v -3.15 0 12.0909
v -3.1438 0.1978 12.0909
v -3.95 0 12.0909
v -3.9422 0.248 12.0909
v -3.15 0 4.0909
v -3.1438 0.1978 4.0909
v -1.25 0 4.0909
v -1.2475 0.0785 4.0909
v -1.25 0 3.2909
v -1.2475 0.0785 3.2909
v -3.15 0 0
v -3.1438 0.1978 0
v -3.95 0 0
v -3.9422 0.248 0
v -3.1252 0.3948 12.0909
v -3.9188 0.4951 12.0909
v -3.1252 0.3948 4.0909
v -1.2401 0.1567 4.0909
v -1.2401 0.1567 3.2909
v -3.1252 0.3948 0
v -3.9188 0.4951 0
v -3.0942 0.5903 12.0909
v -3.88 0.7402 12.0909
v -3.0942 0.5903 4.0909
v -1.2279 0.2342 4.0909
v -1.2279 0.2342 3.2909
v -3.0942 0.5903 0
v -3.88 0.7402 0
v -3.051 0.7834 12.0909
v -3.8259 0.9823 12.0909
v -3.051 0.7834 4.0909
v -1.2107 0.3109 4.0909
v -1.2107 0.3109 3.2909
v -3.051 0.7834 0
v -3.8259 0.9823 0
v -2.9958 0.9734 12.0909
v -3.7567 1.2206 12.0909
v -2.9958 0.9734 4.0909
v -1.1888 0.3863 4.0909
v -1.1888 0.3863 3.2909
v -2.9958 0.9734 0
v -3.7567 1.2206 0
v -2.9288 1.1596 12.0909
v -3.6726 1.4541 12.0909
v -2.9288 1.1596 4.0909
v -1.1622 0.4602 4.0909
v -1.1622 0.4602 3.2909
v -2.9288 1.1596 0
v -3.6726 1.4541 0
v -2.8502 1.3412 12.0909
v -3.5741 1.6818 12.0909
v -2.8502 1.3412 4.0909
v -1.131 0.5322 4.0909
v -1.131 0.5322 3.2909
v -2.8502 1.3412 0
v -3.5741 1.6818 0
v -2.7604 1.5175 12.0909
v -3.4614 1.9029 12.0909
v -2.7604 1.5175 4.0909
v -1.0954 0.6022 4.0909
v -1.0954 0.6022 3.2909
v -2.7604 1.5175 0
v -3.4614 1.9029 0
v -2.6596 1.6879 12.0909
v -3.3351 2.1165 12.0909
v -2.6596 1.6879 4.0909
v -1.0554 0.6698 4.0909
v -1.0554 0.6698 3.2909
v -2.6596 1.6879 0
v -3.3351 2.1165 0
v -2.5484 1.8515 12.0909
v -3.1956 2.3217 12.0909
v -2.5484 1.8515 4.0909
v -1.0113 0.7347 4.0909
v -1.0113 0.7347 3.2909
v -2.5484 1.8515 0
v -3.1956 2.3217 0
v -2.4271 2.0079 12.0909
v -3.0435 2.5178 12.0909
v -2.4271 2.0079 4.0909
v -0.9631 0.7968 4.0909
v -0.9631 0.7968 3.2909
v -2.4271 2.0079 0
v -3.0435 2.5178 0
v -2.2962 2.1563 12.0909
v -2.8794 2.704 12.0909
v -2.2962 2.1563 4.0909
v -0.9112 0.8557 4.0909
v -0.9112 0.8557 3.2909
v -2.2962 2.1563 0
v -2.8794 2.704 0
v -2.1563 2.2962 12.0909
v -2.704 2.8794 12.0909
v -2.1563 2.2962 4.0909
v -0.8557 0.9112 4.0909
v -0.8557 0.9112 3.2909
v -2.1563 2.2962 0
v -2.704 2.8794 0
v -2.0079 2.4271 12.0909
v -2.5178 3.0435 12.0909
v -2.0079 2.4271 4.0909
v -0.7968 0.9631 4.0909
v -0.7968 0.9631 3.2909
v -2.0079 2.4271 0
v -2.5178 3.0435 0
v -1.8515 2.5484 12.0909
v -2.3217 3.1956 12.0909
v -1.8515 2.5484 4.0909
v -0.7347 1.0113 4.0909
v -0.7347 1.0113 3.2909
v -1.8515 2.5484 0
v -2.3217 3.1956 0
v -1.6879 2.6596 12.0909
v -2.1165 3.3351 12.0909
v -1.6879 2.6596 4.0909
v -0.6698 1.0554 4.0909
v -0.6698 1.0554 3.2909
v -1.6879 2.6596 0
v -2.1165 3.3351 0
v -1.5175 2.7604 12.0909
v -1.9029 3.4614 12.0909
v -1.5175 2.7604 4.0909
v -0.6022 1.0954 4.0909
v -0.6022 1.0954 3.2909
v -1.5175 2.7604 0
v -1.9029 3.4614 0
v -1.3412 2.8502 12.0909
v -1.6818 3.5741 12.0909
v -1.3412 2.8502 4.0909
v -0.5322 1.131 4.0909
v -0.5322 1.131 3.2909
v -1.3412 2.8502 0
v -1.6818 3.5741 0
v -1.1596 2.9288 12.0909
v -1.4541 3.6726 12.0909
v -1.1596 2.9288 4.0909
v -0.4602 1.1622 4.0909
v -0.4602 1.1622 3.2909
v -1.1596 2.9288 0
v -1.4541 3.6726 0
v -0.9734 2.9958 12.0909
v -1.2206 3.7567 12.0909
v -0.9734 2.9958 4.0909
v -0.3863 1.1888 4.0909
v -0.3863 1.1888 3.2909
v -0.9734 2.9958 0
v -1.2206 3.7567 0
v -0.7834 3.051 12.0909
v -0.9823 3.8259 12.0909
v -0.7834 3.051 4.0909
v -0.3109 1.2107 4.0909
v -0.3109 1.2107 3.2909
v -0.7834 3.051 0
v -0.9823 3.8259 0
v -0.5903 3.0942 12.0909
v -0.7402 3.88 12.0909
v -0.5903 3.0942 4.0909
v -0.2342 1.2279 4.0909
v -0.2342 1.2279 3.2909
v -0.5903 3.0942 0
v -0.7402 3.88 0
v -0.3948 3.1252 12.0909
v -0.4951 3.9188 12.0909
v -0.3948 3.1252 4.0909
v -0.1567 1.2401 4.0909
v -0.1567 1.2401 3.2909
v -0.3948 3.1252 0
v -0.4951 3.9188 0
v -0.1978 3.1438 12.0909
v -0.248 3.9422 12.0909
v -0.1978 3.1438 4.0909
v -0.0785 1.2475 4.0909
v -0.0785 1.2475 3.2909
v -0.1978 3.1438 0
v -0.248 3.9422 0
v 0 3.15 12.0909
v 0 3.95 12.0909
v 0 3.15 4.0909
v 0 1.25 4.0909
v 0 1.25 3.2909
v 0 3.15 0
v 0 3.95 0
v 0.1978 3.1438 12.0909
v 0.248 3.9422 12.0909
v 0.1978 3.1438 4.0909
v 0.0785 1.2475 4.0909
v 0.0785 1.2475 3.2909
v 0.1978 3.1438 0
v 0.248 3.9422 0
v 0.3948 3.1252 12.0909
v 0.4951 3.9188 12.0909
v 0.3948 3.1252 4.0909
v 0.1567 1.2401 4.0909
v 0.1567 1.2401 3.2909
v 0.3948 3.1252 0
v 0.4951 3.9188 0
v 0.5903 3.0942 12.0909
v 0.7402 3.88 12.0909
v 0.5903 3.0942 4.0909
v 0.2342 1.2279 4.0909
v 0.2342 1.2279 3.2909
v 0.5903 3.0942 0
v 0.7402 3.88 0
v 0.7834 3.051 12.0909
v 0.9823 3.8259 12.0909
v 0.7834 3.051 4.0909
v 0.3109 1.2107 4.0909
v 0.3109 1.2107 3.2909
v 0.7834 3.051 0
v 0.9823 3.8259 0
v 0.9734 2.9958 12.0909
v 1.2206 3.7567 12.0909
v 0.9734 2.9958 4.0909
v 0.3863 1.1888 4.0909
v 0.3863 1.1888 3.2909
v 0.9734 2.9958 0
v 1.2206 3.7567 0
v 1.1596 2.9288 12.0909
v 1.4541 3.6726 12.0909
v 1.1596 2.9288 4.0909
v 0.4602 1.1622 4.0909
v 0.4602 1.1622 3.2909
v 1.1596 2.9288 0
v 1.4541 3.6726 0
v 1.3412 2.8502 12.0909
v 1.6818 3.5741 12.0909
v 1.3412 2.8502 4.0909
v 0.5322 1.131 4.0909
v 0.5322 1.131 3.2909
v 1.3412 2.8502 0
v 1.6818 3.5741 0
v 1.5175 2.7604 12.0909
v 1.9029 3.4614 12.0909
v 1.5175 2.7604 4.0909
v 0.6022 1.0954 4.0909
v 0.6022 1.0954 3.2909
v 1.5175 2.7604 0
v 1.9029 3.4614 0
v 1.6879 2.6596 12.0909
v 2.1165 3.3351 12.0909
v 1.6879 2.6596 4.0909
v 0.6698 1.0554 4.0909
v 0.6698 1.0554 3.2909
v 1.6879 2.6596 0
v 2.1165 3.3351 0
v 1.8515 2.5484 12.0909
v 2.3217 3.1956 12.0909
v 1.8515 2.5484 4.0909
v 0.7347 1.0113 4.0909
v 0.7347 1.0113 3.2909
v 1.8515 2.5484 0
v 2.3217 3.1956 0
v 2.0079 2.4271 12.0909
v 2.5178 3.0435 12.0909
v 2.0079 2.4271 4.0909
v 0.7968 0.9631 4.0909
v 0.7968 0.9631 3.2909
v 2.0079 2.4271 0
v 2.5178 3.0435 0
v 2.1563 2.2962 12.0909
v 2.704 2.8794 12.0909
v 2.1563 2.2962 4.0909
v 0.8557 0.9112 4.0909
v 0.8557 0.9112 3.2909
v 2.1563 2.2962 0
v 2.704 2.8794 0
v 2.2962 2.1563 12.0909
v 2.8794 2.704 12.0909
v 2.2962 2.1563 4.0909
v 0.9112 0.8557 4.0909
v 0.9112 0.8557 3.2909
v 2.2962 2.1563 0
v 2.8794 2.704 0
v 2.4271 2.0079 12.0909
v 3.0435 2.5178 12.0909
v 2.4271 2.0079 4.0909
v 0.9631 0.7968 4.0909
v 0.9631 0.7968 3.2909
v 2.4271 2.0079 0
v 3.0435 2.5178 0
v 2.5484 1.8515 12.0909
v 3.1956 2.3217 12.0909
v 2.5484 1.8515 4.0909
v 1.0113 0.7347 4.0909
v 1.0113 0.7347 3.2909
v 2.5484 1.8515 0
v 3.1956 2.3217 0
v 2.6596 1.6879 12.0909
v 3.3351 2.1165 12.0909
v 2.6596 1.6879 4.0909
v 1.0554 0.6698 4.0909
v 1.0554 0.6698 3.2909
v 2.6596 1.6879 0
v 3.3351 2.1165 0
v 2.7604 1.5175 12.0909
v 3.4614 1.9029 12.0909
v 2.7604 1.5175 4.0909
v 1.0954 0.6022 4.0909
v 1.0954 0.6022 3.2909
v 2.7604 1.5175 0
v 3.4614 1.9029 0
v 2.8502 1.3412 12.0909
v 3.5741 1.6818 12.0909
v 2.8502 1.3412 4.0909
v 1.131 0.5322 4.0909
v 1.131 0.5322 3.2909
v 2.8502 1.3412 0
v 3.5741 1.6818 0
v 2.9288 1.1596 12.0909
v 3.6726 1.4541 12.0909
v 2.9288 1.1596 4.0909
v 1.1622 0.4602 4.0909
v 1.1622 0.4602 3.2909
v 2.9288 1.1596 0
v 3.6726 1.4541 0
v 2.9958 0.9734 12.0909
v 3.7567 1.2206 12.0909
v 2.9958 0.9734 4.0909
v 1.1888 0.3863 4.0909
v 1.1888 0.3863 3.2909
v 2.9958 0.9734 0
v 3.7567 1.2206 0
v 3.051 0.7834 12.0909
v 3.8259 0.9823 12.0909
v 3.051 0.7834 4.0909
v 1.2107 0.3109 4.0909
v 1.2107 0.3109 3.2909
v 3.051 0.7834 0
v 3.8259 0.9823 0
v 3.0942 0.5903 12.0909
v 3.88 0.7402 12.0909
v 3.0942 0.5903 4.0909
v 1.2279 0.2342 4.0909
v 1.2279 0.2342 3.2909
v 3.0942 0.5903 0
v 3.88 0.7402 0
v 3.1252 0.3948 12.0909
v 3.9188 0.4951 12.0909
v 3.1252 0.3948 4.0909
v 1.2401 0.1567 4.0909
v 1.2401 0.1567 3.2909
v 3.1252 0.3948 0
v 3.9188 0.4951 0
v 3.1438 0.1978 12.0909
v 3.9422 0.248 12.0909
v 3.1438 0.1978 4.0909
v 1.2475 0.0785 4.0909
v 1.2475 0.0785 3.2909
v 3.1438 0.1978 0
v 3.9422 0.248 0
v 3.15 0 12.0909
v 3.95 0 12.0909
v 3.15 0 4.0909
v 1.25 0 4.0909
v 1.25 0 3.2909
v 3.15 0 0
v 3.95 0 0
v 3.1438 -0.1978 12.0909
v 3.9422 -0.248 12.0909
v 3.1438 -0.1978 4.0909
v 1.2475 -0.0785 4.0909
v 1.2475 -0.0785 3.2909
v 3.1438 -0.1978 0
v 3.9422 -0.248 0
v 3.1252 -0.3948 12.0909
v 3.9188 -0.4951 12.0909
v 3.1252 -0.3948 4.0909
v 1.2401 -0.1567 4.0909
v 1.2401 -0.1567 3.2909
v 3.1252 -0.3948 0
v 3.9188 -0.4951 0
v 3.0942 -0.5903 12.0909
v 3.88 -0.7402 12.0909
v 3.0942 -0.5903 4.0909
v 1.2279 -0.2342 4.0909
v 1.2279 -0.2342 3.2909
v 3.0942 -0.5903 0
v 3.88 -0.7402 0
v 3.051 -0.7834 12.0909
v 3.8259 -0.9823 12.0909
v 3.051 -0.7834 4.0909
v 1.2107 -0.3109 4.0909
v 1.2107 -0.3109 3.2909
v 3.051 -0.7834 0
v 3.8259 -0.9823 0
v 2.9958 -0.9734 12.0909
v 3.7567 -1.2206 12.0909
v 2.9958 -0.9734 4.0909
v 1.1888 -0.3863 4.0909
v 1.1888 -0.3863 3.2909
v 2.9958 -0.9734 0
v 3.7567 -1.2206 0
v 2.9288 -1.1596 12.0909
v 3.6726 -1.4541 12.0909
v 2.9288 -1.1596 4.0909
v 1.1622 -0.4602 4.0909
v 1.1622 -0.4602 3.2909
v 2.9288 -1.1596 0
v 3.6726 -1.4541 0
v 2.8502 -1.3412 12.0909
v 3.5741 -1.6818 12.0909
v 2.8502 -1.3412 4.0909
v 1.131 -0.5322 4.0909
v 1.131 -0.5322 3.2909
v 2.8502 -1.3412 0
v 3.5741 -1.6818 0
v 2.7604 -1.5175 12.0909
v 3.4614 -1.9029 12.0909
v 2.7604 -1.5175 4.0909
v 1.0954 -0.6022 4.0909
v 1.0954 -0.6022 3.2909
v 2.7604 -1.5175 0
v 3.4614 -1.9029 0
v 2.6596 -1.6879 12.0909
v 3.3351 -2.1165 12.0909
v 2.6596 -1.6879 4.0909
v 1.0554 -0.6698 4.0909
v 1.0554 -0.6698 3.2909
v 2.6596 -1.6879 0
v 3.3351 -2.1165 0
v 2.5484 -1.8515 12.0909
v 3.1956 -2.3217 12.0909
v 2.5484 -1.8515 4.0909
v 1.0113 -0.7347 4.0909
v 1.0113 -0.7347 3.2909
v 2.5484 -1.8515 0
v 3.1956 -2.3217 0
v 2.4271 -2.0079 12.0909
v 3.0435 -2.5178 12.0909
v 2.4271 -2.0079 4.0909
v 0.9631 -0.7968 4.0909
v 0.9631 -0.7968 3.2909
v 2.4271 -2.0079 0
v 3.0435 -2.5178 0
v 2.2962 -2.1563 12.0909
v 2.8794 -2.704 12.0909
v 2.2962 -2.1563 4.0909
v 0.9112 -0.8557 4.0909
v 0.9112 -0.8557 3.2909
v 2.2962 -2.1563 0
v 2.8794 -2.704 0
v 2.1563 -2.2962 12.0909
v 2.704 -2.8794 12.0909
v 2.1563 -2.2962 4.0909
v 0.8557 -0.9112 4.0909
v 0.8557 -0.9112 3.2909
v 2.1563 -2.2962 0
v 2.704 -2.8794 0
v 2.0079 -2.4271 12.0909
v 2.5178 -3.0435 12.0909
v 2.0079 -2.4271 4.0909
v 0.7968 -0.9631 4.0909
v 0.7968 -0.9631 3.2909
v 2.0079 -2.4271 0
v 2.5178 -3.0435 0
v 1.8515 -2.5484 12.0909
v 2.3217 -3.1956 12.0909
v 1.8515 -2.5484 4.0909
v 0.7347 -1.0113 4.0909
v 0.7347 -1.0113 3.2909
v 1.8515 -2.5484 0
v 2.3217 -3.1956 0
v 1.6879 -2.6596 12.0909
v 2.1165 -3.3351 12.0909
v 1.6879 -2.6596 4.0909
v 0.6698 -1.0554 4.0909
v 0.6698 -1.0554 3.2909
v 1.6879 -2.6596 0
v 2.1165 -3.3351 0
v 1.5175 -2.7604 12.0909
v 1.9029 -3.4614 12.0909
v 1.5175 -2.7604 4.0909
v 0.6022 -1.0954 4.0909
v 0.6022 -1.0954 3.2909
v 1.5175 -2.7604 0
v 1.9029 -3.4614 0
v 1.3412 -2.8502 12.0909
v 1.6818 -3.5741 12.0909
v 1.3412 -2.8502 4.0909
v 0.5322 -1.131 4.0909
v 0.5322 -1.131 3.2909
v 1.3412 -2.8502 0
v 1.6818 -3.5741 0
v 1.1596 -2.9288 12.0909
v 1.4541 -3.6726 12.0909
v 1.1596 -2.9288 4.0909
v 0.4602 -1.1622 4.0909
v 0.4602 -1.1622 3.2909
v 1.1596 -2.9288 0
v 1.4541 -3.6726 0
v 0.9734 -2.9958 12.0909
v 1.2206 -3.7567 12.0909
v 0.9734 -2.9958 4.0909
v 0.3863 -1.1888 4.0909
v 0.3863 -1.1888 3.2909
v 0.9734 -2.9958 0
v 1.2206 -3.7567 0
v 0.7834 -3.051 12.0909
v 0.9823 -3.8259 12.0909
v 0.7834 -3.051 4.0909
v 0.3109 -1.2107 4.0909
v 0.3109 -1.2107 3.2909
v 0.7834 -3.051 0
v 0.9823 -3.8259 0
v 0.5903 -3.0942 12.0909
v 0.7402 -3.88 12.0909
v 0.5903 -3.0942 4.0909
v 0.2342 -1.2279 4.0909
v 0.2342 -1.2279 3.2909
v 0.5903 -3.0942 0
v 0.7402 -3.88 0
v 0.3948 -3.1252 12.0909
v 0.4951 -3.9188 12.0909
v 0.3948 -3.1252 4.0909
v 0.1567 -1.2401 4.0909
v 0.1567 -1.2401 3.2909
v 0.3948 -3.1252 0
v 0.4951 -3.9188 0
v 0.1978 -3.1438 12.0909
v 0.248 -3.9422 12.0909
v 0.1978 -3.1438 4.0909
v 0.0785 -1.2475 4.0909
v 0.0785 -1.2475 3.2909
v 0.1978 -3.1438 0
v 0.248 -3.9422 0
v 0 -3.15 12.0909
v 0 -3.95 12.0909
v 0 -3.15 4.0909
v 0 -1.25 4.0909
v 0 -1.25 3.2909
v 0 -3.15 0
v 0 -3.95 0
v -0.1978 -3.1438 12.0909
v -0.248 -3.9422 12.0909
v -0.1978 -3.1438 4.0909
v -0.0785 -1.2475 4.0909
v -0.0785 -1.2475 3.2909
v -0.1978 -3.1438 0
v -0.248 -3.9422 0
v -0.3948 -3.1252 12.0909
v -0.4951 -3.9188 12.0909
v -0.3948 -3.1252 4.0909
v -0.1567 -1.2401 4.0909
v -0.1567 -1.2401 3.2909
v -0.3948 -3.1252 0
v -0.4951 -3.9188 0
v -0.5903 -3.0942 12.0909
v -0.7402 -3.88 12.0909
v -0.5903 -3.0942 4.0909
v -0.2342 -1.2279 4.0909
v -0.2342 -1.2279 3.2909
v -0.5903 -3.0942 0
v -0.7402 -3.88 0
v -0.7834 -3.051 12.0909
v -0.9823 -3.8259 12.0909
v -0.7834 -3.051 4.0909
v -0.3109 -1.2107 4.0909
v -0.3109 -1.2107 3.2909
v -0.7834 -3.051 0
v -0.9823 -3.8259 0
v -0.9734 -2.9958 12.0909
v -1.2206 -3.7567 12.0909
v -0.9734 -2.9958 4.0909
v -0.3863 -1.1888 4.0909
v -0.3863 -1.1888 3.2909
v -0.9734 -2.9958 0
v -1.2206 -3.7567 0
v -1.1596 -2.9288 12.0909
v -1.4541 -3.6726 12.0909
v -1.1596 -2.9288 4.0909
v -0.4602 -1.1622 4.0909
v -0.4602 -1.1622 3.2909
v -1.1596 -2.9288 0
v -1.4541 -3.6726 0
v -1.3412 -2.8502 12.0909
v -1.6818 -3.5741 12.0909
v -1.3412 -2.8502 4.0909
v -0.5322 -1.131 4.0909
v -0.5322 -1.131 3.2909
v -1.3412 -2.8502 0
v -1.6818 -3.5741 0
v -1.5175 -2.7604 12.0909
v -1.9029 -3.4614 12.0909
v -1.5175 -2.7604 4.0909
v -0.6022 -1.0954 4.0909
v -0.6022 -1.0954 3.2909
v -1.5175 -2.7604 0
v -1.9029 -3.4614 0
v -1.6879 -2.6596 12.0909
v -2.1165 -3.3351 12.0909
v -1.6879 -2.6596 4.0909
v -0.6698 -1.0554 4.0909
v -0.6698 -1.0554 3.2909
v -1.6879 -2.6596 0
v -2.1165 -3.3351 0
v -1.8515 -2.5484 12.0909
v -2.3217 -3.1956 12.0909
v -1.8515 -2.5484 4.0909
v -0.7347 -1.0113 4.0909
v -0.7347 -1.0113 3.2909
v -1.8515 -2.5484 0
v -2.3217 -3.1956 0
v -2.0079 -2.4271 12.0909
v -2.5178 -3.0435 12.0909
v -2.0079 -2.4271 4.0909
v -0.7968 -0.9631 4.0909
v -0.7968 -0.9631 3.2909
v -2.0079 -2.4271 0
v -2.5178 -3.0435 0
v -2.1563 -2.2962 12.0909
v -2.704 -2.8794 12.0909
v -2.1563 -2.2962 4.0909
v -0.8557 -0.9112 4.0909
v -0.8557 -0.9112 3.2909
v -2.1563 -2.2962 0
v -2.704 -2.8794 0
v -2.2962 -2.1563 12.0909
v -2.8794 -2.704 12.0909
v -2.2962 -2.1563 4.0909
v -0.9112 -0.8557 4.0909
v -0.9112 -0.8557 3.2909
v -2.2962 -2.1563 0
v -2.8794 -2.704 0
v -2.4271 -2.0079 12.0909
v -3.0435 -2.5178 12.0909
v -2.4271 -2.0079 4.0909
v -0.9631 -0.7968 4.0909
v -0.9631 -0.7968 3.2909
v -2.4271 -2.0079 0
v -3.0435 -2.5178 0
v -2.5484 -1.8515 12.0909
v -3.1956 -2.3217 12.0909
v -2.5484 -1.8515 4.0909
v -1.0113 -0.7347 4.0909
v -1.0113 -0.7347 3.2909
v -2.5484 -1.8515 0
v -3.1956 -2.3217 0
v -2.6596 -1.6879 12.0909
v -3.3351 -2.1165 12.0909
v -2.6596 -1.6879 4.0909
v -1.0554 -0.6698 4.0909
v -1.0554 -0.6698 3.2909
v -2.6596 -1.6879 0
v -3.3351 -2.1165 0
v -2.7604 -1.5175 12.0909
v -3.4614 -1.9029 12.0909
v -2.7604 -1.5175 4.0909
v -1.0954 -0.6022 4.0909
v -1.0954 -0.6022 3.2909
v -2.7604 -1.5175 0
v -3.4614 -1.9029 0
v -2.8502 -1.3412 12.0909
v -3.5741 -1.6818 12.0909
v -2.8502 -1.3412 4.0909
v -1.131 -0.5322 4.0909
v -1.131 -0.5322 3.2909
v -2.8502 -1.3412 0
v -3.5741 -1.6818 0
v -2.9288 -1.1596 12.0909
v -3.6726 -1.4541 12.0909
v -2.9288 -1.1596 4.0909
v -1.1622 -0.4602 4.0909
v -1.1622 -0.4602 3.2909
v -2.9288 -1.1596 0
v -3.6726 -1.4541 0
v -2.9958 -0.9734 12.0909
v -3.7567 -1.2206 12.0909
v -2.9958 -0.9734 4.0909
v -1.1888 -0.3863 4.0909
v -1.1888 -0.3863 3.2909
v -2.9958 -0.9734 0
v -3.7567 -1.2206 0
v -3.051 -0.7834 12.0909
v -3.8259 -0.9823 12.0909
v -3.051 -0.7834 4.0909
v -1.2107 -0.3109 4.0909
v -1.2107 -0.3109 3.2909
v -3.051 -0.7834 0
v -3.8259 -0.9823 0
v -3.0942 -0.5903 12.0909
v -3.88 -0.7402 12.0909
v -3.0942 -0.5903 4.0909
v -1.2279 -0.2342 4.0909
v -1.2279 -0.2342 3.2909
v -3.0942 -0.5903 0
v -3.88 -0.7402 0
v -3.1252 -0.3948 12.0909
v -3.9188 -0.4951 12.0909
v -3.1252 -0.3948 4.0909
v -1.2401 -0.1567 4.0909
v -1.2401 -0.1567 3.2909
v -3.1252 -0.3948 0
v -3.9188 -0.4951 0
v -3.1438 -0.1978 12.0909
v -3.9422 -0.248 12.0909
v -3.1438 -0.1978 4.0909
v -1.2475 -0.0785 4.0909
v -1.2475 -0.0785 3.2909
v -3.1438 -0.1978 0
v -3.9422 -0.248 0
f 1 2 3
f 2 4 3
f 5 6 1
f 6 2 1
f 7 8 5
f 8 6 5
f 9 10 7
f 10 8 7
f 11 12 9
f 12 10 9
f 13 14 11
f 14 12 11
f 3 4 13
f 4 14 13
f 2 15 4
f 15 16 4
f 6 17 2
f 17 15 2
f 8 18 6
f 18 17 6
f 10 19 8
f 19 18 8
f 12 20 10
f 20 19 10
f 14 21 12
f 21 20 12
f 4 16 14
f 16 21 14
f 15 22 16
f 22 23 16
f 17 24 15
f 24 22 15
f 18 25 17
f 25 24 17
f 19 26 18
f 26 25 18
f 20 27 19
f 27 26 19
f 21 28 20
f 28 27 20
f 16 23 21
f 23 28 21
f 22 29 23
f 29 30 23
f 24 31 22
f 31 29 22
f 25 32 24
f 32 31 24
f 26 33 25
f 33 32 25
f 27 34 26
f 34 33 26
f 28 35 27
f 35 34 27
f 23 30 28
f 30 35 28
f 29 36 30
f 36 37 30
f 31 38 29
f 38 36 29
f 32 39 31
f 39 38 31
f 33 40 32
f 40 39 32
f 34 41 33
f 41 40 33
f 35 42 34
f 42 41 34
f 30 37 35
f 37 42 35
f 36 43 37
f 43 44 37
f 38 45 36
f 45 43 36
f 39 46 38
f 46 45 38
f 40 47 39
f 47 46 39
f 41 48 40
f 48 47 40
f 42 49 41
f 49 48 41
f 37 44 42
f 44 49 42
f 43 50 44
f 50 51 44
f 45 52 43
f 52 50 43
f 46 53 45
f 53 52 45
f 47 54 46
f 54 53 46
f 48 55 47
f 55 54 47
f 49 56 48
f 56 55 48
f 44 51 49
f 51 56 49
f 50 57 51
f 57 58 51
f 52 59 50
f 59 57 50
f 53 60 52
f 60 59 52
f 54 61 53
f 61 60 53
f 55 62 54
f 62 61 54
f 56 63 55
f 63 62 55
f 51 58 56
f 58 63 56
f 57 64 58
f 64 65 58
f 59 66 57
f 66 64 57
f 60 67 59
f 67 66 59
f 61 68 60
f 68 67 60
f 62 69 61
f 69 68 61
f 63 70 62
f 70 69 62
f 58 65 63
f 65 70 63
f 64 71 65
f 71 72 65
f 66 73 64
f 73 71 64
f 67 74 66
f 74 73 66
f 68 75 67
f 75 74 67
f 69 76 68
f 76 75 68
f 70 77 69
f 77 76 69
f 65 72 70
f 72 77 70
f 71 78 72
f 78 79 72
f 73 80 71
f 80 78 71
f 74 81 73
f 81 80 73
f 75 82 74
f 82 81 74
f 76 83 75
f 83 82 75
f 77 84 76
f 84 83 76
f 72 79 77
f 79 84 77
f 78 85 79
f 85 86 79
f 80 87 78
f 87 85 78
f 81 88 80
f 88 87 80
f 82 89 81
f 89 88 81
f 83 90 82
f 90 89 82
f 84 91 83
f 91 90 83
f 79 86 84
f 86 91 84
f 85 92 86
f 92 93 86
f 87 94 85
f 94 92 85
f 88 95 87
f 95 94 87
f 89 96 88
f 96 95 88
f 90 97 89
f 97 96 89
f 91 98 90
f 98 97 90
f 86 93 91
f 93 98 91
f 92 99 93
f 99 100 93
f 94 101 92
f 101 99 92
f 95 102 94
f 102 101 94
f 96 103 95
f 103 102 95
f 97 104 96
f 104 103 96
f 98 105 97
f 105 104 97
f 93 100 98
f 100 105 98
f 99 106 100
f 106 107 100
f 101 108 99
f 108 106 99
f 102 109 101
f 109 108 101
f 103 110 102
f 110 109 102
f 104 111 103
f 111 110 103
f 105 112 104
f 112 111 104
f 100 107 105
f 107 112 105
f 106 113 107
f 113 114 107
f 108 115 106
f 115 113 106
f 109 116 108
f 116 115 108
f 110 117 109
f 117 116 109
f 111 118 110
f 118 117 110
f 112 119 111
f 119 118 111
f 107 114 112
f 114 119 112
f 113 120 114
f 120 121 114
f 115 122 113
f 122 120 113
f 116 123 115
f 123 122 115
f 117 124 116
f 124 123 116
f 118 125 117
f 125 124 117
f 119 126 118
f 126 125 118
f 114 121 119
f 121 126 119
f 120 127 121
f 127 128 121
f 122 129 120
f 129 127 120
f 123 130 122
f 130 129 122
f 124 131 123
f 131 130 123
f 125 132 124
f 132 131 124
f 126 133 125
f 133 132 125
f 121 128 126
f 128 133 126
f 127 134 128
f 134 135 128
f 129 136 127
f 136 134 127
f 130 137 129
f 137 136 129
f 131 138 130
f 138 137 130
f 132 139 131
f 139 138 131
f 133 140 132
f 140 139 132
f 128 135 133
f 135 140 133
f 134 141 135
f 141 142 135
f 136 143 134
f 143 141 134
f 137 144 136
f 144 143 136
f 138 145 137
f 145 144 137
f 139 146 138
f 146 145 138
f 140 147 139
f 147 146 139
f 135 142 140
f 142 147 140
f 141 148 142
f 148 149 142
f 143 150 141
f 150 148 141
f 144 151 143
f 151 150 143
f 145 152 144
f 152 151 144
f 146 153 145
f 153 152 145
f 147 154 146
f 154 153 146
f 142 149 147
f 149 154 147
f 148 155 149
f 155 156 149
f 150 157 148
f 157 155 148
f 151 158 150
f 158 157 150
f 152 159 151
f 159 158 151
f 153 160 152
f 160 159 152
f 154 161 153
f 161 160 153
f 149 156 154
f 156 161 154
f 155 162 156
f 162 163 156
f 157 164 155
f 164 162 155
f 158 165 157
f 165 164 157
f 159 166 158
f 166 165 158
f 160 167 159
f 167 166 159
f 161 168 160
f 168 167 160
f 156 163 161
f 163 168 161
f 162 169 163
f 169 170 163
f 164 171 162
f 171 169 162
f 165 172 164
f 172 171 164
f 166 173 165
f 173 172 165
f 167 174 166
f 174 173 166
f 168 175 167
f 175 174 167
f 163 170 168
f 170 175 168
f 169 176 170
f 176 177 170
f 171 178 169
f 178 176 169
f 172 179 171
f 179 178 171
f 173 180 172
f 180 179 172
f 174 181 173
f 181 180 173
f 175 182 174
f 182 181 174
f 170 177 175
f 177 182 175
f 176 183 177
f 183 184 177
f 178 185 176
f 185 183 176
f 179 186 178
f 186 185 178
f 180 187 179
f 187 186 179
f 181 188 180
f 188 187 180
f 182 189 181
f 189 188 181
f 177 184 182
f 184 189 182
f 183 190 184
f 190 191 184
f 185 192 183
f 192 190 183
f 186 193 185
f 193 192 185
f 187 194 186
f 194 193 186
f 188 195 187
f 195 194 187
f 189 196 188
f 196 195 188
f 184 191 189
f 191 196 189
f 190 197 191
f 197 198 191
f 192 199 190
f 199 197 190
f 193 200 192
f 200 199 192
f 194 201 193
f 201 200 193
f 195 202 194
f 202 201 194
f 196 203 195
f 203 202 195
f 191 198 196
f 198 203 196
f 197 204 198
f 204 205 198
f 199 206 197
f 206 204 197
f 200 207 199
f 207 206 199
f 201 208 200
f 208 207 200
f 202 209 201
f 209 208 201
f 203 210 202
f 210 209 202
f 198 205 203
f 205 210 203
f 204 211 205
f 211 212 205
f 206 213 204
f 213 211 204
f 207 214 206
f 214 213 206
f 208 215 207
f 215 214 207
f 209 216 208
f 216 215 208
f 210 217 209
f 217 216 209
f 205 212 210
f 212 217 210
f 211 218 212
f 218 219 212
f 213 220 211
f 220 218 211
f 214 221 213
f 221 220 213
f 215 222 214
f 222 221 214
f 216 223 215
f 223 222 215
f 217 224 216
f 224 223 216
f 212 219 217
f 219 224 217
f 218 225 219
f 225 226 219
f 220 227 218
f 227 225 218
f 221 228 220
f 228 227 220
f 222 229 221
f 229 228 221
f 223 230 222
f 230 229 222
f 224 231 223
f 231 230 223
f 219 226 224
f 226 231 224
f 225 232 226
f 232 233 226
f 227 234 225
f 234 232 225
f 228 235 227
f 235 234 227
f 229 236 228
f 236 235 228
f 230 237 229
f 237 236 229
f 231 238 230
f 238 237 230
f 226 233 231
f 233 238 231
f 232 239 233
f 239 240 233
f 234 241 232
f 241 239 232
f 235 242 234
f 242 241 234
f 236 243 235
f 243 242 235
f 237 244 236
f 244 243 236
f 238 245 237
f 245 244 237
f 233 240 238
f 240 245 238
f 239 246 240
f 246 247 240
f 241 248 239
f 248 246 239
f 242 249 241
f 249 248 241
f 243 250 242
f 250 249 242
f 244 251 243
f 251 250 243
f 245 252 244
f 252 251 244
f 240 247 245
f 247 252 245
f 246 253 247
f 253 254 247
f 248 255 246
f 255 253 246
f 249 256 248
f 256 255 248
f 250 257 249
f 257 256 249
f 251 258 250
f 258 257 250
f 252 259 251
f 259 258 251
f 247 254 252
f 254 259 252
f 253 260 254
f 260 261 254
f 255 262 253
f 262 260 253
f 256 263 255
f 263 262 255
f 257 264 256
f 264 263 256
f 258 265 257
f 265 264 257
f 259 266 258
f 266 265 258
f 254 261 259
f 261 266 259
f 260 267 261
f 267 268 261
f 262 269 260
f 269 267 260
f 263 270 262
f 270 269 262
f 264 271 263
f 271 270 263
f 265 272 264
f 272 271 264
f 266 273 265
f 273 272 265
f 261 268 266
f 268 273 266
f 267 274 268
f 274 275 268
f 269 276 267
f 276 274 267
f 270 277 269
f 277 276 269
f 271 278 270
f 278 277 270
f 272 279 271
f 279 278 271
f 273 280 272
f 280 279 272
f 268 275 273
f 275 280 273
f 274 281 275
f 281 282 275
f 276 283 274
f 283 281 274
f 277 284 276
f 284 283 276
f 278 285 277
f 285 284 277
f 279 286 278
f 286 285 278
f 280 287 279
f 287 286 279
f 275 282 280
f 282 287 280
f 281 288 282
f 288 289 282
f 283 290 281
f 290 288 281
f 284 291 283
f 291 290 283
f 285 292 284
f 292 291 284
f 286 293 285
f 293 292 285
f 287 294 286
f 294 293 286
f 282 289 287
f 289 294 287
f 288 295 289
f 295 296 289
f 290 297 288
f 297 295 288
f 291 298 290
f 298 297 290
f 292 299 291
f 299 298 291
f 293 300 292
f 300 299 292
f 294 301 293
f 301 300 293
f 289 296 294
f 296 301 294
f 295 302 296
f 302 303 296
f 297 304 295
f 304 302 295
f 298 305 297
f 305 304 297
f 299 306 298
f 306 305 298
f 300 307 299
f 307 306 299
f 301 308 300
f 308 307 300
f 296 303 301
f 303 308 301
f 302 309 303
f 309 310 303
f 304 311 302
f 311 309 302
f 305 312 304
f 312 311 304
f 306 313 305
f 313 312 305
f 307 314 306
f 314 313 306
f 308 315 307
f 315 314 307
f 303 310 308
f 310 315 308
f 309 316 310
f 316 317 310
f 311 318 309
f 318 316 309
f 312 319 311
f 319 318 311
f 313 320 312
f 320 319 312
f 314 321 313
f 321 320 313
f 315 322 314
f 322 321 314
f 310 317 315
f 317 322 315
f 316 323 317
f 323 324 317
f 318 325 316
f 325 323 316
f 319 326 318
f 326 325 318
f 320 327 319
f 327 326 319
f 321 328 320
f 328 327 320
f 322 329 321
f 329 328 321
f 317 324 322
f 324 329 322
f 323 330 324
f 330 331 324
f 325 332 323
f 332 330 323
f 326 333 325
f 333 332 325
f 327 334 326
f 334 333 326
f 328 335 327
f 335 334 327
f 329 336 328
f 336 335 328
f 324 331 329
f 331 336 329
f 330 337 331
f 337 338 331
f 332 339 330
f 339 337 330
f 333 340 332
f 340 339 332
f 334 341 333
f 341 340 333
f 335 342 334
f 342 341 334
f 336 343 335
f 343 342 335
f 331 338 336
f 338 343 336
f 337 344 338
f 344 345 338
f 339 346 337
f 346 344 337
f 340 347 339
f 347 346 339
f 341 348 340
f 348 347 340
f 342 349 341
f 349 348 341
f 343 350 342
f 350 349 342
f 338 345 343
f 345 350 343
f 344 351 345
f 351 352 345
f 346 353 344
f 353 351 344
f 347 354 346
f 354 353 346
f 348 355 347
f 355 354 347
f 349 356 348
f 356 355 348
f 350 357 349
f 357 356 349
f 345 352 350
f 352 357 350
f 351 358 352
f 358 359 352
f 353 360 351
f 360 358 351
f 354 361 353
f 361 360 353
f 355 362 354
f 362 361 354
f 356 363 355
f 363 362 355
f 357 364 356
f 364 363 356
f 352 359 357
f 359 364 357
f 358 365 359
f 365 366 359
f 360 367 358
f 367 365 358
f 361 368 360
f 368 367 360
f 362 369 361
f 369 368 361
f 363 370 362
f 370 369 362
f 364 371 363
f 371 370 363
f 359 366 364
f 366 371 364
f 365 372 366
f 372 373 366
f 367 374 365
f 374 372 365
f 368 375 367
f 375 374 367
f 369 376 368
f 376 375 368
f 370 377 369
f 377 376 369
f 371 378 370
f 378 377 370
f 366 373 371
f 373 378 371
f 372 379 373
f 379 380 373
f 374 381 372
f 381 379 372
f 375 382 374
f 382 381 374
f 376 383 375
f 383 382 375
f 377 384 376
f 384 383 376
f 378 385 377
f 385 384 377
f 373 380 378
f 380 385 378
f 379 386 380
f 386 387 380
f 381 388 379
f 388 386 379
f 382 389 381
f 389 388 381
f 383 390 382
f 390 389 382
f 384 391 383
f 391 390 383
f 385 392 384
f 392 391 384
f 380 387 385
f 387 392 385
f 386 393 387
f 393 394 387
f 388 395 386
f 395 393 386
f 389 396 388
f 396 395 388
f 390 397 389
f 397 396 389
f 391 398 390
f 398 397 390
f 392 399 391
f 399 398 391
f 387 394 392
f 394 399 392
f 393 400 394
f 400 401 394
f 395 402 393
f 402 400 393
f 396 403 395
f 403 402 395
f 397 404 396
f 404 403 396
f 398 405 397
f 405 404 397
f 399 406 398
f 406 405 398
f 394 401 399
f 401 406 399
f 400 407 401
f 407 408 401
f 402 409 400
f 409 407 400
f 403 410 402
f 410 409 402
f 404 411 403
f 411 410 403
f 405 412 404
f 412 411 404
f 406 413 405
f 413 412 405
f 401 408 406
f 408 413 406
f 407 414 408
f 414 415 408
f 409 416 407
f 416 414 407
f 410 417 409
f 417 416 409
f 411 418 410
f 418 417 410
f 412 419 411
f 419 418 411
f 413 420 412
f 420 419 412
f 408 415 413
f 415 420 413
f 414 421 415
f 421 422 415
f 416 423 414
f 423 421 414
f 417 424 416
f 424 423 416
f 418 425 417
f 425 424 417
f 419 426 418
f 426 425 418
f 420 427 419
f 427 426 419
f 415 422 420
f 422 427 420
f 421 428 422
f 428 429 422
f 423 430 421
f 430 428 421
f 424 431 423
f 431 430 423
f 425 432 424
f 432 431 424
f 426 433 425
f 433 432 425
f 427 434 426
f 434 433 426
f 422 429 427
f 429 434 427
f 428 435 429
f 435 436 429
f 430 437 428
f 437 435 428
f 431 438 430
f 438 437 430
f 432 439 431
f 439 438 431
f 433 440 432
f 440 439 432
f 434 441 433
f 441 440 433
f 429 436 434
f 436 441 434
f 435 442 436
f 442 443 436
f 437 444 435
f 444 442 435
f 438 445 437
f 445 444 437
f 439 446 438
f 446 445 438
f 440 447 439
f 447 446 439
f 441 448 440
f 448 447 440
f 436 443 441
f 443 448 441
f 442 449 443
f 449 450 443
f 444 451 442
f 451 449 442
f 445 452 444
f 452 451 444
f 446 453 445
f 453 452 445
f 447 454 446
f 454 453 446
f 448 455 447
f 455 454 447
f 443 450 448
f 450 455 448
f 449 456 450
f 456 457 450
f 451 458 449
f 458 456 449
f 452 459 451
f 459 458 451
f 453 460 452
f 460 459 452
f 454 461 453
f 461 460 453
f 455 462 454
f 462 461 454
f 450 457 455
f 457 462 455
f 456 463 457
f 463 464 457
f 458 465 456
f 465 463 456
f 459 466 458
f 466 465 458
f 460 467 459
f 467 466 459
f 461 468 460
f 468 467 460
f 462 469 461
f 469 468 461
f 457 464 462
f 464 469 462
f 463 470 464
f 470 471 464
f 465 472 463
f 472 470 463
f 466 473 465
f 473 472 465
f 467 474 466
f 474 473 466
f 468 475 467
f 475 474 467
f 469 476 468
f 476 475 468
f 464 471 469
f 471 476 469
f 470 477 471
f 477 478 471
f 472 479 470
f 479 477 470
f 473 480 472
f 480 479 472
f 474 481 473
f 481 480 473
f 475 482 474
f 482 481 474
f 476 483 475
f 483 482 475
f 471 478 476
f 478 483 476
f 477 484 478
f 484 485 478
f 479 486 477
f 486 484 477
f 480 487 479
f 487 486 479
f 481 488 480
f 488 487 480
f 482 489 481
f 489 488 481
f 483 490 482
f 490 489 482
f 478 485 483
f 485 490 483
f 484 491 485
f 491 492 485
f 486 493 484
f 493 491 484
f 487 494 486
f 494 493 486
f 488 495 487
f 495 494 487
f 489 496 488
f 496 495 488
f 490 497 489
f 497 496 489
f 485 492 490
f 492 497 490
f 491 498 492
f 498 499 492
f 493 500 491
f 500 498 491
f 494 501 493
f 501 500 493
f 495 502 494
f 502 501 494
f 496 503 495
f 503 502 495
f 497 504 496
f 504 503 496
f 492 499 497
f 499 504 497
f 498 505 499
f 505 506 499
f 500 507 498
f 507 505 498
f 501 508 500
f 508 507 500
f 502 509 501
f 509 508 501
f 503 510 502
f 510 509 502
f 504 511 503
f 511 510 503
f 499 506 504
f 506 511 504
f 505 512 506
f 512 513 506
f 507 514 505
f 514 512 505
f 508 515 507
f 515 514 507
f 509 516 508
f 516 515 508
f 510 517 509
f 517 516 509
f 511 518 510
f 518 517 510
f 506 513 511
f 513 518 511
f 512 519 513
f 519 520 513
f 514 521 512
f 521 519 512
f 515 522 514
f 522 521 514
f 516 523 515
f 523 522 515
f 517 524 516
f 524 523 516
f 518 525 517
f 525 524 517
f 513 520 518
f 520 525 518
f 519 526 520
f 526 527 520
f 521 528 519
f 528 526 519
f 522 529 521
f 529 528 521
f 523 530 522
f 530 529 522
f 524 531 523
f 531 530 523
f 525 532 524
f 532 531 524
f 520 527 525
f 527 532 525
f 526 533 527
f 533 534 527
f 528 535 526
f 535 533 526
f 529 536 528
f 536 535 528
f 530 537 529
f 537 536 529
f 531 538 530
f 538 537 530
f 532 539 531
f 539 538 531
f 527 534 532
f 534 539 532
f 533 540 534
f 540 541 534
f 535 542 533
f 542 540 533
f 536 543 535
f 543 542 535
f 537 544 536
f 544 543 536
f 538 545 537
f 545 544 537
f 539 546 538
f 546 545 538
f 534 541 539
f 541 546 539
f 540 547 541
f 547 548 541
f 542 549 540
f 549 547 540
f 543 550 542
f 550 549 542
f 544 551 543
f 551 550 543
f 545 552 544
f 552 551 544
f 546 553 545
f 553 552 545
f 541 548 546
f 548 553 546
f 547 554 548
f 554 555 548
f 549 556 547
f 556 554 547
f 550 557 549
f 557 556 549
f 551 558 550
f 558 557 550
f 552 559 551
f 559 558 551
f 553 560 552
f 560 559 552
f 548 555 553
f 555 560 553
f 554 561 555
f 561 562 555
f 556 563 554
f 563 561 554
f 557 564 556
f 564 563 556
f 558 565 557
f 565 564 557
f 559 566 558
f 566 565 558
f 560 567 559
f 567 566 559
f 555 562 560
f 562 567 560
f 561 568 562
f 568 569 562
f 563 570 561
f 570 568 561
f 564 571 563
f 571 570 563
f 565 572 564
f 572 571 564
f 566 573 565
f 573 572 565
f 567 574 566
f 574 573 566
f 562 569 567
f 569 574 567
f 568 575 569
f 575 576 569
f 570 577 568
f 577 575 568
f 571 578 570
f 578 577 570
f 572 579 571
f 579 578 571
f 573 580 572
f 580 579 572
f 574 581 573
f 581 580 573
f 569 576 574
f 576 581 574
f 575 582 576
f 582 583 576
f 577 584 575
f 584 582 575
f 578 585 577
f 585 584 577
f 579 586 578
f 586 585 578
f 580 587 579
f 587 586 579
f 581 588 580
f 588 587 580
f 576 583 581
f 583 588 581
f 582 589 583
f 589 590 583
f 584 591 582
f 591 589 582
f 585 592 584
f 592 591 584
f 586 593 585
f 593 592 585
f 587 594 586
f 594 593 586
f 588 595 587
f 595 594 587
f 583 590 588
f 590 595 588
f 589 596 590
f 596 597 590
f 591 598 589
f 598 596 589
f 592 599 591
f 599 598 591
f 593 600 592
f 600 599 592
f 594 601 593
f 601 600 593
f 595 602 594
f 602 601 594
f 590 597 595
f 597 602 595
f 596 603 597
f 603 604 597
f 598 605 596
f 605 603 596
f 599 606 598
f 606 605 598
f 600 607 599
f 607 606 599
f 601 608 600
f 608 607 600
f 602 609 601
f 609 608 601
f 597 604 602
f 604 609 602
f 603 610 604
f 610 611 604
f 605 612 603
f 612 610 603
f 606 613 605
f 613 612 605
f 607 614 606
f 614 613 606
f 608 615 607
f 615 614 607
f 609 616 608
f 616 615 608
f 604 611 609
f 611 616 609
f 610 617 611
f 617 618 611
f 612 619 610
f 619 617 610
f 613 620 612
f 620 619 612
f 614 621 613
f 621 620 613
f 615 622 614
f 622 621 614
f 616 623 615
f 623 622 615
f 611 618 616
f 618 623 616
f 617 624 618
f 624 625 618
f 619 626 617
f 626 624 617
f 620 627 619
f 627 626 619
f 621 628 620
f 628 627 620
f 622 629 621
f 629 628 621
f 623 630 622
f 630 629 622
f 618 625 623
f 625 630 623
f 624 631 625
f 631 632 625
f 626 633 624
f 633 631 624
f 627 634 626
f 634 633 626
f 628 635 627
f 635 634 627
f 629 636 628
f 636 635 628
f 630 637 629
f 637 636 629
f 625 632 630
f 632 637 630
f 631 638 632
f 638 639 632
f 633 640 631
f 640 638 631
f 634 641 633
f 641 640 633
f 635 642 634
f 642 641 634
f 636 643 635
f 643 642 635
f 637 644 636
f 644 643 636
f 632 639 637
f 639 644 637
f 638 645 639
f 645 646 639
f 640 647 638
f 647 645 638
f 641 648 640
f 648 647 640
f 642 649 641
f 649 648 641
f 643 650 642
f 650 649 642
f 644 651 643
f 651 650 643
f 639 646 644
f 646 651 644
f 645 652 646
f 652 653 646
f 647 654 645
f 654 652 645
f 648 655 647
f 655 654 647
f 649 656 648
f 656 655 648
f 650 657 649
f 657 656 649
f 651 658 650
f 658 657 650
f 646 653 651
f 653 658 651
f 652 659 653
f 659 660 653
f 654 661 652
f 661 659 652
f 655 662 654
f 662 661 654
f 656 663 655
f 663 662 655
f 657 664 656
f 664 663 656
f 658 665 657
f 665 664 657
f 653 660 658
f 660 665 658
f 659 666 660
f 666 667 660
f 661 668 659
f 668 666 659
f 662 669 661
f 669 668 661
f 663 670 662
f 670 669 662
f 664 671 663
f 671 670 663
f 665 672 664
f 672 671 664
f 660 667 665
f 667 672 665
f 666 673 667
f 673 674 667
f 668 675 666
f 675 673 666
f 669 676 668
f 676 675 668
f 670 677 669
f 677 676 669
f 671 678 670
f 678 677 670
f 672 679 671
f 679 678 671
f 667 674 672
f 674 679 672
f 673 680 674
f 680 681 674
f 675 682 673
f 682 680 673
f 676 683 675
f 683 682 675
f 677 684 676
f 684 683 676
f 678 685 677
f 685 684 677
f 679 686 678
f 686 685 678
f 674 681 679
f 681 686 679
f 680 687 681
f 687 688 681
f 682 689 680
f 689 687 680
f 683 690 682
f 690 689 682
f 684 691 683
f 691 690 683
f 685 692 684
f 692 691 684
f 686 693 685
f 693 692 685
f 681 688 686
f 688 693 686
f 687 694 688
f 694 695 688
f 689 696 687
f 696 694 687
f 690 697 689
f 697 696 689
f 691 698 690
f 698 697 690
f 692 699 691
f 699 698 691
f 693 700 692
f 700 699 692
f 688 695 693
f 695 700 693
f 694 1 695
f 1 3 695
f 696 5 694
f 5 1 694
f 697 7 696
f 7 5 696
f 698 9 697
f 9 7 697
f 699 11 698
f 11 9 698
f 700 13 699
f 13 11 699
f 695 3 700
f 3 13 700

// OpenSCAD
// preview[view:south, tilt:bottom diagonal]

// Number of sides for the curves
$fn=100;

// Diameter of the tube this will slip over.
outer_diameter = 6.3;

// Diameter of the filament hole in the tube.
inner_diameter = 2.5;

// Thickness of the walls around the tube and the wall between the funnel and the sleeve.
wall_thickness = 0.8 ;

// Angle of slope for the funnel, where 90 is horizontal. Determines how tall the funnel will be. Don't exceed your printer's maximum overhang.
funnel_angle = 30;

// Height of the sleeve that slips over the end of the tubr
sleeve_height = 8;

outer_radius = outer_diameter / 2;
inner_radius = inner_diameter / 2;

funnel_height = (outer_diameter - inner_diameter) / (2 * tan(funnel_angle));

module funnel(outer_diameter = outer_diameter) {
  outer_radius = outer_diameter/2;

  // Best way in the world to make anything with rotational
  // symmetry: sculpt it as a polygon, then rotate_extrude.
	rotate_extrude()
	polygon([
	  [outer_radius, 0],
	  [outer_radius + wall_thickness, 0],
	  [outer_radius + wall_thickness, funnel_height + wall_thickness + sleeve_height],
	  [outer_radius, funnel_height + wall_thickness + sleeve_height],
	  [outer_radius, funnel_height + wall_thickness],
	  [inner_radius, funnel_height + wall_thickness],
	  [inner_radius, funnel_height]
	]);
}

funnel();
